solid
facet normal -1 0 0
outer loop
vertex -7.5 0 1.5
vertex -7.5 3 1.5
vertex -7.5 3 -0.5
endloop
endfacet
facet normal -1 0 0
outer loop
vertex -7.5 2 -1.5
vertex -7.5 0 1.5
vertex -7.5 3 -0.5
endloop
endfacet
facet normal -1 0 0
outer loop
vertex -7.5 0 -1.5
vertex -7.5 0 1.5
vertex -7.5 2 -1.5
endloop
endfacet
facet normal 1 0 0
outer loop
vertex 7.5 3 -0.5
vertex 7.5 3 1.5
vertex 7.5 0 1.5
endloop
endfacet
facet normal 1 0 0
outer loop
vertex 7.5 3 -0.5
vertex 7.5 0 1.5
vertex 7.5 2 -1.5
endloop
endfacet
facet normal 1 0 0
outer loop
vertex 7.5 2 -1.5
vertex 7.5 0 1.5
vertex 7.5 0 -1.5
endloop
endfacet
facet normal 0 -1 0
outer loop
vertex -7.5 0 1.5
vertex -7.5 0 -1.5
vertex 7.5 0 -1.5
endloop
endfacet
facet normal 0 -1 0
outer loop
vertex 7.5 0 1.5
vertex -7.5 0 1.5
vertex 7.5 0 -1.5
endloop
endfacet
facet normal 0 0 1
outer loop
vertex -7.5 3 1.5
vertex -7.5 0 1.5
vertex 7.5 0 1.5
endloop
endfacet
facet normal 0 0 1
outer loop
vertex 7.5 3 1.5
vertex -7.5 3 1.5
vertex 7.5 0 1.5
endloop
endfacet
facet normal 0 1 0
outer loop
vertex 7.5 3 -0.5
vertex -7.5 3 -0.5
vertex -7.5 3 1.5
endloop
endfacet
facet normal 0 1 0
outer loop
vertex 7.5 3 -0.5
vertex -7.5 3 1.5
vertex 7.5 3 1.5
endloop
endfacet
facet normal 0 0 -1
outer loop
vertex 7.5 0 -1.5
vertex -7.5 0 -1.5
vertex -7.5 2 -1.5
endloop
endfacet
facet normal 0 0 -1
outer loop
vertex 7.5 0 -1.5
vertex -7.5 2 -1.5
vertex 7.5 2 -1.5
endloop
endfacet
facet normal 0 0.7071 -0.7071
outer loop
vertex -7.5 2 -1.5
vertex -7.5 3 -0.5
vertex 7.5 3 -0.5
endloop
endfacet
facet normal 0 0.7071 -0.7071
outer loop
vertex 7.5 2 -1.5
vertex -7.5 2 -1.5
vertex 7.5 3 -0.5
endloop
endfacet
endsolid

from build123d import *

# Parameters (mm, degrees)
SKETCH_1_W      = 15
SKETCH_1_H      = 3
EXTRUDE_1_DEPTH = 3
CHAMFER_1_SIZE  = 1


with BuildPart() as part:
    # Эскиз1 → Бобышка-Вытянуть1 (new body)
    with BuildSketch(Plane(origin=(0, 0, 0), x_dir=(1, 0, 0), z_dir=(0, 1, 0))):
        Rectangle(SKETCH_1_W, SKETCH_1_H)
    extrude(amount=EXTRUDE_1_DEPTH)

    # Фаска1
    chamfer_1_edges = [part.edges().sort_by_distance(p)[0] for p in [
        (0, 3, -1.5),
    ]]
    chamfer(chamfer_1_edges, length=CHAMFER_1_SIZE)


solid = part.part
